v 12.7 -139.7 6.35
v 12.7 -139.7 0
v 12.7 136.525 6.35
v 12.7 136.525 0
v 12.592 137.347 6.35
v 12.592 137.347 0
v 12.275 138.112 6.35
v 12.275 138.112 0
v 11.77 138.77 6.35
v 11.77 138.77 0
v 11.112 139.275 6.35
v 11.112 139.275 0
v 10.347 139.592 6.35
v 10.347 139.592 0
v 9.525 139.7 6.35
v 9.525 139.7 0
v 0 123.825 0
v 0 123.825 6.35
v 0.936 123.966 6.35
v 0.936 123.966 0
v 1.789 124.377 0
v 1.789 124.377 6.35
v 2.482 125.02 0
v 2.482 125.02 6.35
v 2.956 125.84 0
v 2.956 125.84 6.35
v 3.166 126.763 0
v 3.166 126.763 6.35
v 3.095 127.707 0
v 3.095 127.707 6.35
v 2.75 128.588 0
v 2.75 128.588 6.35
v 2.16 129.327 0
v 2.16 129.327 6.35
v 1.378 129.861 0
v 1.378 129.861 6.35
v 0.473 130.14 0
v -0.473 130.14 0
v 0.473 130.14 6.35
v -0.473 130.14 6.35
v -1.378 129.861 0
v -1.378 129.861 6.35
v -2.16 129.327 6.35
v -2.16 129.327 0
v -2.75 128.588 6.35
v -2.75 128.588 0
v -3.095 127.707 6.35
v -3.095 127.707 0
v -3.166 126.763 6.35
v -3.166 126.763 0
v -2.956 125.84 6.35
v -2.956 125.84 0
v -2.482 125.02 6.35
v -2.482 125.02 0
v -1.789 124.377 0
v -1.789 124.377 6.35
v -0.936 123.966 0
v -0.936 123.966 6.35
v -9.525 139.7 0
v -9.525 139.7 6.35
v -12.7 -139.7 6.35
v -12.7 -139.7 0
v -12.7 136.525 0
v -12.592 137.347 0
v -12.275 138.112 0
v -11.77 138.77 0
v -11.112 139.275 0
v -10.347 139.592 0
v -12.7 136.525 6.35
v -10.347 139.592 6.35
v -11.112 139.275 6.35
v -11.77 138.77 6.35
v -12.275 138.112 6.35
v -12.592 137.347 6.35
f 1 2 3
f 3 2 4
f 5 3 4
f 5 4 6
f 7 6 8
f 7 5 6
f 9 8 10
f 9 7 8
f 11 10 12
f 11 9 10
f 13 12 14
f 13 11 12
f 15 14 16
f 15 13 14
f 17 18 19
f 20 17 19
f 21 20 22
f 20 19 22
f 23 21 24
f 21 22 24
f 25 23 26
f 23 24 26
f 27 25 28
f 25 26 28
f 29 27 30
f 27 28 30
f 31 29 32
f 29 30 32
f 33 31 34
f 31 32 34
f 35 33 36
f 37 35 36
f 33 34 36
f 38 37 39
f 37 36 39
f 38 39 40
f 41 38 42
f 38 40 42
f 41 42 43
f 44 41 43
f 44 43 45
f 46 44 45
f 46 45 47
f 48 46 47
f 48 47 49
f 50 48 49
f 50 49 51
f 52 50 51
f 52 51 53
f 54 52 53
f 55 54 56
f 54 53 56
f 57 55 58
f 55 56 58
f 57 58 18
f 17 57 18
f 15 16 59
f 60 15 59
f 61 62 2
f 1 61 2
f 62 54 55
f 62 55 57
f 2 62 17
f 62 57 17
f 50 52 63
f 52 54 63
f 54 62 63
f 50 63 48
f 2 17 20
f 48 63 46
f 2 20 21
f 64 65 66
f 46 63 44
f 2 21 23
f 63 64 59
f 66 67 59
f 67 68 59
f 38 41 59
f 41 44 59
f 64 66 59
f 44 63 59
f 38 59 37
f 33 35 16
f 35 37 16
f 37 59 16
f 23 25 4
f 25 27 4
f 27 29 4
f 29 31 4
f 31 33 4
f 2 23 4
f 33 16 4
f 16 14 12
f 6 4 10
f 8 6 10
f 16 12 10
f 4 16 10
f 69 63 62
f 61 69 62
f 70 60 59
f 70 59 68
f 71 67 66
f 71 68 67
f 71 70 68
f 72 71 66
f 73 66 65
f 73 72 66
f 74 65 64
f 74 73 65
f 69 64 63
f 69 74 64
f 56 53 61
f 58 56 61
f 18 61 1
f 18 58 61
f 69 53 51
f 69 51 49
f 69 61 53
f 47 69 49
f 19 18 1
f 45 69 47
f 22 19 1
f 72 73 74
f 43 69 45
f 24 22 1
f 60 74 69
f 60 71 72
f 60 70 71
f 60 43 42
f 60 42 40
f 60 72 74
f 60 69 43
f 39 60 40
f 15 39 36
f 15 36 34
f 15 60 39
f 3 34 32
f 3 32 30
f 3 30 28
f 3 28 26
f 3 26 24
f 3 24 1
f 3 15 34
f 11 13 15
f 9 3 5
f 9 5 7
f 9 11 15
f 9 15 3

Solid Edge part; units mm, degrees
sketch "Sketch1" plane through (0, 0, 0) normal (0, 0, 1) x (1, 0, 0)
  line L0 (-12.7, -139.7) -> (12.7, -139.7)
  line L1 (12.7, -139.7) -> (12.7, 139.7)
  line L2 (12.7, 139.7) -> (-12.7, 139.7)
  line L3 (-12.7, 139.7) -> (-12.7, -139.7)
  dimension "D1" = 25.4
  dimension "D2" = 279.4
extrude "Protrusion1" add sketch "Sketch1" along normal blind 6.35
hole "Hole_1" at (0, 127, 6.35) direction (0, 0, -1) diameter 6.35 end up to next
fillet "Round_1" radius 3.175 2 edges at (12.7, 139.7, 3.175) (-12.7, 139.7, 3.175)
properties part number "SPaRC - 02 - 002"
